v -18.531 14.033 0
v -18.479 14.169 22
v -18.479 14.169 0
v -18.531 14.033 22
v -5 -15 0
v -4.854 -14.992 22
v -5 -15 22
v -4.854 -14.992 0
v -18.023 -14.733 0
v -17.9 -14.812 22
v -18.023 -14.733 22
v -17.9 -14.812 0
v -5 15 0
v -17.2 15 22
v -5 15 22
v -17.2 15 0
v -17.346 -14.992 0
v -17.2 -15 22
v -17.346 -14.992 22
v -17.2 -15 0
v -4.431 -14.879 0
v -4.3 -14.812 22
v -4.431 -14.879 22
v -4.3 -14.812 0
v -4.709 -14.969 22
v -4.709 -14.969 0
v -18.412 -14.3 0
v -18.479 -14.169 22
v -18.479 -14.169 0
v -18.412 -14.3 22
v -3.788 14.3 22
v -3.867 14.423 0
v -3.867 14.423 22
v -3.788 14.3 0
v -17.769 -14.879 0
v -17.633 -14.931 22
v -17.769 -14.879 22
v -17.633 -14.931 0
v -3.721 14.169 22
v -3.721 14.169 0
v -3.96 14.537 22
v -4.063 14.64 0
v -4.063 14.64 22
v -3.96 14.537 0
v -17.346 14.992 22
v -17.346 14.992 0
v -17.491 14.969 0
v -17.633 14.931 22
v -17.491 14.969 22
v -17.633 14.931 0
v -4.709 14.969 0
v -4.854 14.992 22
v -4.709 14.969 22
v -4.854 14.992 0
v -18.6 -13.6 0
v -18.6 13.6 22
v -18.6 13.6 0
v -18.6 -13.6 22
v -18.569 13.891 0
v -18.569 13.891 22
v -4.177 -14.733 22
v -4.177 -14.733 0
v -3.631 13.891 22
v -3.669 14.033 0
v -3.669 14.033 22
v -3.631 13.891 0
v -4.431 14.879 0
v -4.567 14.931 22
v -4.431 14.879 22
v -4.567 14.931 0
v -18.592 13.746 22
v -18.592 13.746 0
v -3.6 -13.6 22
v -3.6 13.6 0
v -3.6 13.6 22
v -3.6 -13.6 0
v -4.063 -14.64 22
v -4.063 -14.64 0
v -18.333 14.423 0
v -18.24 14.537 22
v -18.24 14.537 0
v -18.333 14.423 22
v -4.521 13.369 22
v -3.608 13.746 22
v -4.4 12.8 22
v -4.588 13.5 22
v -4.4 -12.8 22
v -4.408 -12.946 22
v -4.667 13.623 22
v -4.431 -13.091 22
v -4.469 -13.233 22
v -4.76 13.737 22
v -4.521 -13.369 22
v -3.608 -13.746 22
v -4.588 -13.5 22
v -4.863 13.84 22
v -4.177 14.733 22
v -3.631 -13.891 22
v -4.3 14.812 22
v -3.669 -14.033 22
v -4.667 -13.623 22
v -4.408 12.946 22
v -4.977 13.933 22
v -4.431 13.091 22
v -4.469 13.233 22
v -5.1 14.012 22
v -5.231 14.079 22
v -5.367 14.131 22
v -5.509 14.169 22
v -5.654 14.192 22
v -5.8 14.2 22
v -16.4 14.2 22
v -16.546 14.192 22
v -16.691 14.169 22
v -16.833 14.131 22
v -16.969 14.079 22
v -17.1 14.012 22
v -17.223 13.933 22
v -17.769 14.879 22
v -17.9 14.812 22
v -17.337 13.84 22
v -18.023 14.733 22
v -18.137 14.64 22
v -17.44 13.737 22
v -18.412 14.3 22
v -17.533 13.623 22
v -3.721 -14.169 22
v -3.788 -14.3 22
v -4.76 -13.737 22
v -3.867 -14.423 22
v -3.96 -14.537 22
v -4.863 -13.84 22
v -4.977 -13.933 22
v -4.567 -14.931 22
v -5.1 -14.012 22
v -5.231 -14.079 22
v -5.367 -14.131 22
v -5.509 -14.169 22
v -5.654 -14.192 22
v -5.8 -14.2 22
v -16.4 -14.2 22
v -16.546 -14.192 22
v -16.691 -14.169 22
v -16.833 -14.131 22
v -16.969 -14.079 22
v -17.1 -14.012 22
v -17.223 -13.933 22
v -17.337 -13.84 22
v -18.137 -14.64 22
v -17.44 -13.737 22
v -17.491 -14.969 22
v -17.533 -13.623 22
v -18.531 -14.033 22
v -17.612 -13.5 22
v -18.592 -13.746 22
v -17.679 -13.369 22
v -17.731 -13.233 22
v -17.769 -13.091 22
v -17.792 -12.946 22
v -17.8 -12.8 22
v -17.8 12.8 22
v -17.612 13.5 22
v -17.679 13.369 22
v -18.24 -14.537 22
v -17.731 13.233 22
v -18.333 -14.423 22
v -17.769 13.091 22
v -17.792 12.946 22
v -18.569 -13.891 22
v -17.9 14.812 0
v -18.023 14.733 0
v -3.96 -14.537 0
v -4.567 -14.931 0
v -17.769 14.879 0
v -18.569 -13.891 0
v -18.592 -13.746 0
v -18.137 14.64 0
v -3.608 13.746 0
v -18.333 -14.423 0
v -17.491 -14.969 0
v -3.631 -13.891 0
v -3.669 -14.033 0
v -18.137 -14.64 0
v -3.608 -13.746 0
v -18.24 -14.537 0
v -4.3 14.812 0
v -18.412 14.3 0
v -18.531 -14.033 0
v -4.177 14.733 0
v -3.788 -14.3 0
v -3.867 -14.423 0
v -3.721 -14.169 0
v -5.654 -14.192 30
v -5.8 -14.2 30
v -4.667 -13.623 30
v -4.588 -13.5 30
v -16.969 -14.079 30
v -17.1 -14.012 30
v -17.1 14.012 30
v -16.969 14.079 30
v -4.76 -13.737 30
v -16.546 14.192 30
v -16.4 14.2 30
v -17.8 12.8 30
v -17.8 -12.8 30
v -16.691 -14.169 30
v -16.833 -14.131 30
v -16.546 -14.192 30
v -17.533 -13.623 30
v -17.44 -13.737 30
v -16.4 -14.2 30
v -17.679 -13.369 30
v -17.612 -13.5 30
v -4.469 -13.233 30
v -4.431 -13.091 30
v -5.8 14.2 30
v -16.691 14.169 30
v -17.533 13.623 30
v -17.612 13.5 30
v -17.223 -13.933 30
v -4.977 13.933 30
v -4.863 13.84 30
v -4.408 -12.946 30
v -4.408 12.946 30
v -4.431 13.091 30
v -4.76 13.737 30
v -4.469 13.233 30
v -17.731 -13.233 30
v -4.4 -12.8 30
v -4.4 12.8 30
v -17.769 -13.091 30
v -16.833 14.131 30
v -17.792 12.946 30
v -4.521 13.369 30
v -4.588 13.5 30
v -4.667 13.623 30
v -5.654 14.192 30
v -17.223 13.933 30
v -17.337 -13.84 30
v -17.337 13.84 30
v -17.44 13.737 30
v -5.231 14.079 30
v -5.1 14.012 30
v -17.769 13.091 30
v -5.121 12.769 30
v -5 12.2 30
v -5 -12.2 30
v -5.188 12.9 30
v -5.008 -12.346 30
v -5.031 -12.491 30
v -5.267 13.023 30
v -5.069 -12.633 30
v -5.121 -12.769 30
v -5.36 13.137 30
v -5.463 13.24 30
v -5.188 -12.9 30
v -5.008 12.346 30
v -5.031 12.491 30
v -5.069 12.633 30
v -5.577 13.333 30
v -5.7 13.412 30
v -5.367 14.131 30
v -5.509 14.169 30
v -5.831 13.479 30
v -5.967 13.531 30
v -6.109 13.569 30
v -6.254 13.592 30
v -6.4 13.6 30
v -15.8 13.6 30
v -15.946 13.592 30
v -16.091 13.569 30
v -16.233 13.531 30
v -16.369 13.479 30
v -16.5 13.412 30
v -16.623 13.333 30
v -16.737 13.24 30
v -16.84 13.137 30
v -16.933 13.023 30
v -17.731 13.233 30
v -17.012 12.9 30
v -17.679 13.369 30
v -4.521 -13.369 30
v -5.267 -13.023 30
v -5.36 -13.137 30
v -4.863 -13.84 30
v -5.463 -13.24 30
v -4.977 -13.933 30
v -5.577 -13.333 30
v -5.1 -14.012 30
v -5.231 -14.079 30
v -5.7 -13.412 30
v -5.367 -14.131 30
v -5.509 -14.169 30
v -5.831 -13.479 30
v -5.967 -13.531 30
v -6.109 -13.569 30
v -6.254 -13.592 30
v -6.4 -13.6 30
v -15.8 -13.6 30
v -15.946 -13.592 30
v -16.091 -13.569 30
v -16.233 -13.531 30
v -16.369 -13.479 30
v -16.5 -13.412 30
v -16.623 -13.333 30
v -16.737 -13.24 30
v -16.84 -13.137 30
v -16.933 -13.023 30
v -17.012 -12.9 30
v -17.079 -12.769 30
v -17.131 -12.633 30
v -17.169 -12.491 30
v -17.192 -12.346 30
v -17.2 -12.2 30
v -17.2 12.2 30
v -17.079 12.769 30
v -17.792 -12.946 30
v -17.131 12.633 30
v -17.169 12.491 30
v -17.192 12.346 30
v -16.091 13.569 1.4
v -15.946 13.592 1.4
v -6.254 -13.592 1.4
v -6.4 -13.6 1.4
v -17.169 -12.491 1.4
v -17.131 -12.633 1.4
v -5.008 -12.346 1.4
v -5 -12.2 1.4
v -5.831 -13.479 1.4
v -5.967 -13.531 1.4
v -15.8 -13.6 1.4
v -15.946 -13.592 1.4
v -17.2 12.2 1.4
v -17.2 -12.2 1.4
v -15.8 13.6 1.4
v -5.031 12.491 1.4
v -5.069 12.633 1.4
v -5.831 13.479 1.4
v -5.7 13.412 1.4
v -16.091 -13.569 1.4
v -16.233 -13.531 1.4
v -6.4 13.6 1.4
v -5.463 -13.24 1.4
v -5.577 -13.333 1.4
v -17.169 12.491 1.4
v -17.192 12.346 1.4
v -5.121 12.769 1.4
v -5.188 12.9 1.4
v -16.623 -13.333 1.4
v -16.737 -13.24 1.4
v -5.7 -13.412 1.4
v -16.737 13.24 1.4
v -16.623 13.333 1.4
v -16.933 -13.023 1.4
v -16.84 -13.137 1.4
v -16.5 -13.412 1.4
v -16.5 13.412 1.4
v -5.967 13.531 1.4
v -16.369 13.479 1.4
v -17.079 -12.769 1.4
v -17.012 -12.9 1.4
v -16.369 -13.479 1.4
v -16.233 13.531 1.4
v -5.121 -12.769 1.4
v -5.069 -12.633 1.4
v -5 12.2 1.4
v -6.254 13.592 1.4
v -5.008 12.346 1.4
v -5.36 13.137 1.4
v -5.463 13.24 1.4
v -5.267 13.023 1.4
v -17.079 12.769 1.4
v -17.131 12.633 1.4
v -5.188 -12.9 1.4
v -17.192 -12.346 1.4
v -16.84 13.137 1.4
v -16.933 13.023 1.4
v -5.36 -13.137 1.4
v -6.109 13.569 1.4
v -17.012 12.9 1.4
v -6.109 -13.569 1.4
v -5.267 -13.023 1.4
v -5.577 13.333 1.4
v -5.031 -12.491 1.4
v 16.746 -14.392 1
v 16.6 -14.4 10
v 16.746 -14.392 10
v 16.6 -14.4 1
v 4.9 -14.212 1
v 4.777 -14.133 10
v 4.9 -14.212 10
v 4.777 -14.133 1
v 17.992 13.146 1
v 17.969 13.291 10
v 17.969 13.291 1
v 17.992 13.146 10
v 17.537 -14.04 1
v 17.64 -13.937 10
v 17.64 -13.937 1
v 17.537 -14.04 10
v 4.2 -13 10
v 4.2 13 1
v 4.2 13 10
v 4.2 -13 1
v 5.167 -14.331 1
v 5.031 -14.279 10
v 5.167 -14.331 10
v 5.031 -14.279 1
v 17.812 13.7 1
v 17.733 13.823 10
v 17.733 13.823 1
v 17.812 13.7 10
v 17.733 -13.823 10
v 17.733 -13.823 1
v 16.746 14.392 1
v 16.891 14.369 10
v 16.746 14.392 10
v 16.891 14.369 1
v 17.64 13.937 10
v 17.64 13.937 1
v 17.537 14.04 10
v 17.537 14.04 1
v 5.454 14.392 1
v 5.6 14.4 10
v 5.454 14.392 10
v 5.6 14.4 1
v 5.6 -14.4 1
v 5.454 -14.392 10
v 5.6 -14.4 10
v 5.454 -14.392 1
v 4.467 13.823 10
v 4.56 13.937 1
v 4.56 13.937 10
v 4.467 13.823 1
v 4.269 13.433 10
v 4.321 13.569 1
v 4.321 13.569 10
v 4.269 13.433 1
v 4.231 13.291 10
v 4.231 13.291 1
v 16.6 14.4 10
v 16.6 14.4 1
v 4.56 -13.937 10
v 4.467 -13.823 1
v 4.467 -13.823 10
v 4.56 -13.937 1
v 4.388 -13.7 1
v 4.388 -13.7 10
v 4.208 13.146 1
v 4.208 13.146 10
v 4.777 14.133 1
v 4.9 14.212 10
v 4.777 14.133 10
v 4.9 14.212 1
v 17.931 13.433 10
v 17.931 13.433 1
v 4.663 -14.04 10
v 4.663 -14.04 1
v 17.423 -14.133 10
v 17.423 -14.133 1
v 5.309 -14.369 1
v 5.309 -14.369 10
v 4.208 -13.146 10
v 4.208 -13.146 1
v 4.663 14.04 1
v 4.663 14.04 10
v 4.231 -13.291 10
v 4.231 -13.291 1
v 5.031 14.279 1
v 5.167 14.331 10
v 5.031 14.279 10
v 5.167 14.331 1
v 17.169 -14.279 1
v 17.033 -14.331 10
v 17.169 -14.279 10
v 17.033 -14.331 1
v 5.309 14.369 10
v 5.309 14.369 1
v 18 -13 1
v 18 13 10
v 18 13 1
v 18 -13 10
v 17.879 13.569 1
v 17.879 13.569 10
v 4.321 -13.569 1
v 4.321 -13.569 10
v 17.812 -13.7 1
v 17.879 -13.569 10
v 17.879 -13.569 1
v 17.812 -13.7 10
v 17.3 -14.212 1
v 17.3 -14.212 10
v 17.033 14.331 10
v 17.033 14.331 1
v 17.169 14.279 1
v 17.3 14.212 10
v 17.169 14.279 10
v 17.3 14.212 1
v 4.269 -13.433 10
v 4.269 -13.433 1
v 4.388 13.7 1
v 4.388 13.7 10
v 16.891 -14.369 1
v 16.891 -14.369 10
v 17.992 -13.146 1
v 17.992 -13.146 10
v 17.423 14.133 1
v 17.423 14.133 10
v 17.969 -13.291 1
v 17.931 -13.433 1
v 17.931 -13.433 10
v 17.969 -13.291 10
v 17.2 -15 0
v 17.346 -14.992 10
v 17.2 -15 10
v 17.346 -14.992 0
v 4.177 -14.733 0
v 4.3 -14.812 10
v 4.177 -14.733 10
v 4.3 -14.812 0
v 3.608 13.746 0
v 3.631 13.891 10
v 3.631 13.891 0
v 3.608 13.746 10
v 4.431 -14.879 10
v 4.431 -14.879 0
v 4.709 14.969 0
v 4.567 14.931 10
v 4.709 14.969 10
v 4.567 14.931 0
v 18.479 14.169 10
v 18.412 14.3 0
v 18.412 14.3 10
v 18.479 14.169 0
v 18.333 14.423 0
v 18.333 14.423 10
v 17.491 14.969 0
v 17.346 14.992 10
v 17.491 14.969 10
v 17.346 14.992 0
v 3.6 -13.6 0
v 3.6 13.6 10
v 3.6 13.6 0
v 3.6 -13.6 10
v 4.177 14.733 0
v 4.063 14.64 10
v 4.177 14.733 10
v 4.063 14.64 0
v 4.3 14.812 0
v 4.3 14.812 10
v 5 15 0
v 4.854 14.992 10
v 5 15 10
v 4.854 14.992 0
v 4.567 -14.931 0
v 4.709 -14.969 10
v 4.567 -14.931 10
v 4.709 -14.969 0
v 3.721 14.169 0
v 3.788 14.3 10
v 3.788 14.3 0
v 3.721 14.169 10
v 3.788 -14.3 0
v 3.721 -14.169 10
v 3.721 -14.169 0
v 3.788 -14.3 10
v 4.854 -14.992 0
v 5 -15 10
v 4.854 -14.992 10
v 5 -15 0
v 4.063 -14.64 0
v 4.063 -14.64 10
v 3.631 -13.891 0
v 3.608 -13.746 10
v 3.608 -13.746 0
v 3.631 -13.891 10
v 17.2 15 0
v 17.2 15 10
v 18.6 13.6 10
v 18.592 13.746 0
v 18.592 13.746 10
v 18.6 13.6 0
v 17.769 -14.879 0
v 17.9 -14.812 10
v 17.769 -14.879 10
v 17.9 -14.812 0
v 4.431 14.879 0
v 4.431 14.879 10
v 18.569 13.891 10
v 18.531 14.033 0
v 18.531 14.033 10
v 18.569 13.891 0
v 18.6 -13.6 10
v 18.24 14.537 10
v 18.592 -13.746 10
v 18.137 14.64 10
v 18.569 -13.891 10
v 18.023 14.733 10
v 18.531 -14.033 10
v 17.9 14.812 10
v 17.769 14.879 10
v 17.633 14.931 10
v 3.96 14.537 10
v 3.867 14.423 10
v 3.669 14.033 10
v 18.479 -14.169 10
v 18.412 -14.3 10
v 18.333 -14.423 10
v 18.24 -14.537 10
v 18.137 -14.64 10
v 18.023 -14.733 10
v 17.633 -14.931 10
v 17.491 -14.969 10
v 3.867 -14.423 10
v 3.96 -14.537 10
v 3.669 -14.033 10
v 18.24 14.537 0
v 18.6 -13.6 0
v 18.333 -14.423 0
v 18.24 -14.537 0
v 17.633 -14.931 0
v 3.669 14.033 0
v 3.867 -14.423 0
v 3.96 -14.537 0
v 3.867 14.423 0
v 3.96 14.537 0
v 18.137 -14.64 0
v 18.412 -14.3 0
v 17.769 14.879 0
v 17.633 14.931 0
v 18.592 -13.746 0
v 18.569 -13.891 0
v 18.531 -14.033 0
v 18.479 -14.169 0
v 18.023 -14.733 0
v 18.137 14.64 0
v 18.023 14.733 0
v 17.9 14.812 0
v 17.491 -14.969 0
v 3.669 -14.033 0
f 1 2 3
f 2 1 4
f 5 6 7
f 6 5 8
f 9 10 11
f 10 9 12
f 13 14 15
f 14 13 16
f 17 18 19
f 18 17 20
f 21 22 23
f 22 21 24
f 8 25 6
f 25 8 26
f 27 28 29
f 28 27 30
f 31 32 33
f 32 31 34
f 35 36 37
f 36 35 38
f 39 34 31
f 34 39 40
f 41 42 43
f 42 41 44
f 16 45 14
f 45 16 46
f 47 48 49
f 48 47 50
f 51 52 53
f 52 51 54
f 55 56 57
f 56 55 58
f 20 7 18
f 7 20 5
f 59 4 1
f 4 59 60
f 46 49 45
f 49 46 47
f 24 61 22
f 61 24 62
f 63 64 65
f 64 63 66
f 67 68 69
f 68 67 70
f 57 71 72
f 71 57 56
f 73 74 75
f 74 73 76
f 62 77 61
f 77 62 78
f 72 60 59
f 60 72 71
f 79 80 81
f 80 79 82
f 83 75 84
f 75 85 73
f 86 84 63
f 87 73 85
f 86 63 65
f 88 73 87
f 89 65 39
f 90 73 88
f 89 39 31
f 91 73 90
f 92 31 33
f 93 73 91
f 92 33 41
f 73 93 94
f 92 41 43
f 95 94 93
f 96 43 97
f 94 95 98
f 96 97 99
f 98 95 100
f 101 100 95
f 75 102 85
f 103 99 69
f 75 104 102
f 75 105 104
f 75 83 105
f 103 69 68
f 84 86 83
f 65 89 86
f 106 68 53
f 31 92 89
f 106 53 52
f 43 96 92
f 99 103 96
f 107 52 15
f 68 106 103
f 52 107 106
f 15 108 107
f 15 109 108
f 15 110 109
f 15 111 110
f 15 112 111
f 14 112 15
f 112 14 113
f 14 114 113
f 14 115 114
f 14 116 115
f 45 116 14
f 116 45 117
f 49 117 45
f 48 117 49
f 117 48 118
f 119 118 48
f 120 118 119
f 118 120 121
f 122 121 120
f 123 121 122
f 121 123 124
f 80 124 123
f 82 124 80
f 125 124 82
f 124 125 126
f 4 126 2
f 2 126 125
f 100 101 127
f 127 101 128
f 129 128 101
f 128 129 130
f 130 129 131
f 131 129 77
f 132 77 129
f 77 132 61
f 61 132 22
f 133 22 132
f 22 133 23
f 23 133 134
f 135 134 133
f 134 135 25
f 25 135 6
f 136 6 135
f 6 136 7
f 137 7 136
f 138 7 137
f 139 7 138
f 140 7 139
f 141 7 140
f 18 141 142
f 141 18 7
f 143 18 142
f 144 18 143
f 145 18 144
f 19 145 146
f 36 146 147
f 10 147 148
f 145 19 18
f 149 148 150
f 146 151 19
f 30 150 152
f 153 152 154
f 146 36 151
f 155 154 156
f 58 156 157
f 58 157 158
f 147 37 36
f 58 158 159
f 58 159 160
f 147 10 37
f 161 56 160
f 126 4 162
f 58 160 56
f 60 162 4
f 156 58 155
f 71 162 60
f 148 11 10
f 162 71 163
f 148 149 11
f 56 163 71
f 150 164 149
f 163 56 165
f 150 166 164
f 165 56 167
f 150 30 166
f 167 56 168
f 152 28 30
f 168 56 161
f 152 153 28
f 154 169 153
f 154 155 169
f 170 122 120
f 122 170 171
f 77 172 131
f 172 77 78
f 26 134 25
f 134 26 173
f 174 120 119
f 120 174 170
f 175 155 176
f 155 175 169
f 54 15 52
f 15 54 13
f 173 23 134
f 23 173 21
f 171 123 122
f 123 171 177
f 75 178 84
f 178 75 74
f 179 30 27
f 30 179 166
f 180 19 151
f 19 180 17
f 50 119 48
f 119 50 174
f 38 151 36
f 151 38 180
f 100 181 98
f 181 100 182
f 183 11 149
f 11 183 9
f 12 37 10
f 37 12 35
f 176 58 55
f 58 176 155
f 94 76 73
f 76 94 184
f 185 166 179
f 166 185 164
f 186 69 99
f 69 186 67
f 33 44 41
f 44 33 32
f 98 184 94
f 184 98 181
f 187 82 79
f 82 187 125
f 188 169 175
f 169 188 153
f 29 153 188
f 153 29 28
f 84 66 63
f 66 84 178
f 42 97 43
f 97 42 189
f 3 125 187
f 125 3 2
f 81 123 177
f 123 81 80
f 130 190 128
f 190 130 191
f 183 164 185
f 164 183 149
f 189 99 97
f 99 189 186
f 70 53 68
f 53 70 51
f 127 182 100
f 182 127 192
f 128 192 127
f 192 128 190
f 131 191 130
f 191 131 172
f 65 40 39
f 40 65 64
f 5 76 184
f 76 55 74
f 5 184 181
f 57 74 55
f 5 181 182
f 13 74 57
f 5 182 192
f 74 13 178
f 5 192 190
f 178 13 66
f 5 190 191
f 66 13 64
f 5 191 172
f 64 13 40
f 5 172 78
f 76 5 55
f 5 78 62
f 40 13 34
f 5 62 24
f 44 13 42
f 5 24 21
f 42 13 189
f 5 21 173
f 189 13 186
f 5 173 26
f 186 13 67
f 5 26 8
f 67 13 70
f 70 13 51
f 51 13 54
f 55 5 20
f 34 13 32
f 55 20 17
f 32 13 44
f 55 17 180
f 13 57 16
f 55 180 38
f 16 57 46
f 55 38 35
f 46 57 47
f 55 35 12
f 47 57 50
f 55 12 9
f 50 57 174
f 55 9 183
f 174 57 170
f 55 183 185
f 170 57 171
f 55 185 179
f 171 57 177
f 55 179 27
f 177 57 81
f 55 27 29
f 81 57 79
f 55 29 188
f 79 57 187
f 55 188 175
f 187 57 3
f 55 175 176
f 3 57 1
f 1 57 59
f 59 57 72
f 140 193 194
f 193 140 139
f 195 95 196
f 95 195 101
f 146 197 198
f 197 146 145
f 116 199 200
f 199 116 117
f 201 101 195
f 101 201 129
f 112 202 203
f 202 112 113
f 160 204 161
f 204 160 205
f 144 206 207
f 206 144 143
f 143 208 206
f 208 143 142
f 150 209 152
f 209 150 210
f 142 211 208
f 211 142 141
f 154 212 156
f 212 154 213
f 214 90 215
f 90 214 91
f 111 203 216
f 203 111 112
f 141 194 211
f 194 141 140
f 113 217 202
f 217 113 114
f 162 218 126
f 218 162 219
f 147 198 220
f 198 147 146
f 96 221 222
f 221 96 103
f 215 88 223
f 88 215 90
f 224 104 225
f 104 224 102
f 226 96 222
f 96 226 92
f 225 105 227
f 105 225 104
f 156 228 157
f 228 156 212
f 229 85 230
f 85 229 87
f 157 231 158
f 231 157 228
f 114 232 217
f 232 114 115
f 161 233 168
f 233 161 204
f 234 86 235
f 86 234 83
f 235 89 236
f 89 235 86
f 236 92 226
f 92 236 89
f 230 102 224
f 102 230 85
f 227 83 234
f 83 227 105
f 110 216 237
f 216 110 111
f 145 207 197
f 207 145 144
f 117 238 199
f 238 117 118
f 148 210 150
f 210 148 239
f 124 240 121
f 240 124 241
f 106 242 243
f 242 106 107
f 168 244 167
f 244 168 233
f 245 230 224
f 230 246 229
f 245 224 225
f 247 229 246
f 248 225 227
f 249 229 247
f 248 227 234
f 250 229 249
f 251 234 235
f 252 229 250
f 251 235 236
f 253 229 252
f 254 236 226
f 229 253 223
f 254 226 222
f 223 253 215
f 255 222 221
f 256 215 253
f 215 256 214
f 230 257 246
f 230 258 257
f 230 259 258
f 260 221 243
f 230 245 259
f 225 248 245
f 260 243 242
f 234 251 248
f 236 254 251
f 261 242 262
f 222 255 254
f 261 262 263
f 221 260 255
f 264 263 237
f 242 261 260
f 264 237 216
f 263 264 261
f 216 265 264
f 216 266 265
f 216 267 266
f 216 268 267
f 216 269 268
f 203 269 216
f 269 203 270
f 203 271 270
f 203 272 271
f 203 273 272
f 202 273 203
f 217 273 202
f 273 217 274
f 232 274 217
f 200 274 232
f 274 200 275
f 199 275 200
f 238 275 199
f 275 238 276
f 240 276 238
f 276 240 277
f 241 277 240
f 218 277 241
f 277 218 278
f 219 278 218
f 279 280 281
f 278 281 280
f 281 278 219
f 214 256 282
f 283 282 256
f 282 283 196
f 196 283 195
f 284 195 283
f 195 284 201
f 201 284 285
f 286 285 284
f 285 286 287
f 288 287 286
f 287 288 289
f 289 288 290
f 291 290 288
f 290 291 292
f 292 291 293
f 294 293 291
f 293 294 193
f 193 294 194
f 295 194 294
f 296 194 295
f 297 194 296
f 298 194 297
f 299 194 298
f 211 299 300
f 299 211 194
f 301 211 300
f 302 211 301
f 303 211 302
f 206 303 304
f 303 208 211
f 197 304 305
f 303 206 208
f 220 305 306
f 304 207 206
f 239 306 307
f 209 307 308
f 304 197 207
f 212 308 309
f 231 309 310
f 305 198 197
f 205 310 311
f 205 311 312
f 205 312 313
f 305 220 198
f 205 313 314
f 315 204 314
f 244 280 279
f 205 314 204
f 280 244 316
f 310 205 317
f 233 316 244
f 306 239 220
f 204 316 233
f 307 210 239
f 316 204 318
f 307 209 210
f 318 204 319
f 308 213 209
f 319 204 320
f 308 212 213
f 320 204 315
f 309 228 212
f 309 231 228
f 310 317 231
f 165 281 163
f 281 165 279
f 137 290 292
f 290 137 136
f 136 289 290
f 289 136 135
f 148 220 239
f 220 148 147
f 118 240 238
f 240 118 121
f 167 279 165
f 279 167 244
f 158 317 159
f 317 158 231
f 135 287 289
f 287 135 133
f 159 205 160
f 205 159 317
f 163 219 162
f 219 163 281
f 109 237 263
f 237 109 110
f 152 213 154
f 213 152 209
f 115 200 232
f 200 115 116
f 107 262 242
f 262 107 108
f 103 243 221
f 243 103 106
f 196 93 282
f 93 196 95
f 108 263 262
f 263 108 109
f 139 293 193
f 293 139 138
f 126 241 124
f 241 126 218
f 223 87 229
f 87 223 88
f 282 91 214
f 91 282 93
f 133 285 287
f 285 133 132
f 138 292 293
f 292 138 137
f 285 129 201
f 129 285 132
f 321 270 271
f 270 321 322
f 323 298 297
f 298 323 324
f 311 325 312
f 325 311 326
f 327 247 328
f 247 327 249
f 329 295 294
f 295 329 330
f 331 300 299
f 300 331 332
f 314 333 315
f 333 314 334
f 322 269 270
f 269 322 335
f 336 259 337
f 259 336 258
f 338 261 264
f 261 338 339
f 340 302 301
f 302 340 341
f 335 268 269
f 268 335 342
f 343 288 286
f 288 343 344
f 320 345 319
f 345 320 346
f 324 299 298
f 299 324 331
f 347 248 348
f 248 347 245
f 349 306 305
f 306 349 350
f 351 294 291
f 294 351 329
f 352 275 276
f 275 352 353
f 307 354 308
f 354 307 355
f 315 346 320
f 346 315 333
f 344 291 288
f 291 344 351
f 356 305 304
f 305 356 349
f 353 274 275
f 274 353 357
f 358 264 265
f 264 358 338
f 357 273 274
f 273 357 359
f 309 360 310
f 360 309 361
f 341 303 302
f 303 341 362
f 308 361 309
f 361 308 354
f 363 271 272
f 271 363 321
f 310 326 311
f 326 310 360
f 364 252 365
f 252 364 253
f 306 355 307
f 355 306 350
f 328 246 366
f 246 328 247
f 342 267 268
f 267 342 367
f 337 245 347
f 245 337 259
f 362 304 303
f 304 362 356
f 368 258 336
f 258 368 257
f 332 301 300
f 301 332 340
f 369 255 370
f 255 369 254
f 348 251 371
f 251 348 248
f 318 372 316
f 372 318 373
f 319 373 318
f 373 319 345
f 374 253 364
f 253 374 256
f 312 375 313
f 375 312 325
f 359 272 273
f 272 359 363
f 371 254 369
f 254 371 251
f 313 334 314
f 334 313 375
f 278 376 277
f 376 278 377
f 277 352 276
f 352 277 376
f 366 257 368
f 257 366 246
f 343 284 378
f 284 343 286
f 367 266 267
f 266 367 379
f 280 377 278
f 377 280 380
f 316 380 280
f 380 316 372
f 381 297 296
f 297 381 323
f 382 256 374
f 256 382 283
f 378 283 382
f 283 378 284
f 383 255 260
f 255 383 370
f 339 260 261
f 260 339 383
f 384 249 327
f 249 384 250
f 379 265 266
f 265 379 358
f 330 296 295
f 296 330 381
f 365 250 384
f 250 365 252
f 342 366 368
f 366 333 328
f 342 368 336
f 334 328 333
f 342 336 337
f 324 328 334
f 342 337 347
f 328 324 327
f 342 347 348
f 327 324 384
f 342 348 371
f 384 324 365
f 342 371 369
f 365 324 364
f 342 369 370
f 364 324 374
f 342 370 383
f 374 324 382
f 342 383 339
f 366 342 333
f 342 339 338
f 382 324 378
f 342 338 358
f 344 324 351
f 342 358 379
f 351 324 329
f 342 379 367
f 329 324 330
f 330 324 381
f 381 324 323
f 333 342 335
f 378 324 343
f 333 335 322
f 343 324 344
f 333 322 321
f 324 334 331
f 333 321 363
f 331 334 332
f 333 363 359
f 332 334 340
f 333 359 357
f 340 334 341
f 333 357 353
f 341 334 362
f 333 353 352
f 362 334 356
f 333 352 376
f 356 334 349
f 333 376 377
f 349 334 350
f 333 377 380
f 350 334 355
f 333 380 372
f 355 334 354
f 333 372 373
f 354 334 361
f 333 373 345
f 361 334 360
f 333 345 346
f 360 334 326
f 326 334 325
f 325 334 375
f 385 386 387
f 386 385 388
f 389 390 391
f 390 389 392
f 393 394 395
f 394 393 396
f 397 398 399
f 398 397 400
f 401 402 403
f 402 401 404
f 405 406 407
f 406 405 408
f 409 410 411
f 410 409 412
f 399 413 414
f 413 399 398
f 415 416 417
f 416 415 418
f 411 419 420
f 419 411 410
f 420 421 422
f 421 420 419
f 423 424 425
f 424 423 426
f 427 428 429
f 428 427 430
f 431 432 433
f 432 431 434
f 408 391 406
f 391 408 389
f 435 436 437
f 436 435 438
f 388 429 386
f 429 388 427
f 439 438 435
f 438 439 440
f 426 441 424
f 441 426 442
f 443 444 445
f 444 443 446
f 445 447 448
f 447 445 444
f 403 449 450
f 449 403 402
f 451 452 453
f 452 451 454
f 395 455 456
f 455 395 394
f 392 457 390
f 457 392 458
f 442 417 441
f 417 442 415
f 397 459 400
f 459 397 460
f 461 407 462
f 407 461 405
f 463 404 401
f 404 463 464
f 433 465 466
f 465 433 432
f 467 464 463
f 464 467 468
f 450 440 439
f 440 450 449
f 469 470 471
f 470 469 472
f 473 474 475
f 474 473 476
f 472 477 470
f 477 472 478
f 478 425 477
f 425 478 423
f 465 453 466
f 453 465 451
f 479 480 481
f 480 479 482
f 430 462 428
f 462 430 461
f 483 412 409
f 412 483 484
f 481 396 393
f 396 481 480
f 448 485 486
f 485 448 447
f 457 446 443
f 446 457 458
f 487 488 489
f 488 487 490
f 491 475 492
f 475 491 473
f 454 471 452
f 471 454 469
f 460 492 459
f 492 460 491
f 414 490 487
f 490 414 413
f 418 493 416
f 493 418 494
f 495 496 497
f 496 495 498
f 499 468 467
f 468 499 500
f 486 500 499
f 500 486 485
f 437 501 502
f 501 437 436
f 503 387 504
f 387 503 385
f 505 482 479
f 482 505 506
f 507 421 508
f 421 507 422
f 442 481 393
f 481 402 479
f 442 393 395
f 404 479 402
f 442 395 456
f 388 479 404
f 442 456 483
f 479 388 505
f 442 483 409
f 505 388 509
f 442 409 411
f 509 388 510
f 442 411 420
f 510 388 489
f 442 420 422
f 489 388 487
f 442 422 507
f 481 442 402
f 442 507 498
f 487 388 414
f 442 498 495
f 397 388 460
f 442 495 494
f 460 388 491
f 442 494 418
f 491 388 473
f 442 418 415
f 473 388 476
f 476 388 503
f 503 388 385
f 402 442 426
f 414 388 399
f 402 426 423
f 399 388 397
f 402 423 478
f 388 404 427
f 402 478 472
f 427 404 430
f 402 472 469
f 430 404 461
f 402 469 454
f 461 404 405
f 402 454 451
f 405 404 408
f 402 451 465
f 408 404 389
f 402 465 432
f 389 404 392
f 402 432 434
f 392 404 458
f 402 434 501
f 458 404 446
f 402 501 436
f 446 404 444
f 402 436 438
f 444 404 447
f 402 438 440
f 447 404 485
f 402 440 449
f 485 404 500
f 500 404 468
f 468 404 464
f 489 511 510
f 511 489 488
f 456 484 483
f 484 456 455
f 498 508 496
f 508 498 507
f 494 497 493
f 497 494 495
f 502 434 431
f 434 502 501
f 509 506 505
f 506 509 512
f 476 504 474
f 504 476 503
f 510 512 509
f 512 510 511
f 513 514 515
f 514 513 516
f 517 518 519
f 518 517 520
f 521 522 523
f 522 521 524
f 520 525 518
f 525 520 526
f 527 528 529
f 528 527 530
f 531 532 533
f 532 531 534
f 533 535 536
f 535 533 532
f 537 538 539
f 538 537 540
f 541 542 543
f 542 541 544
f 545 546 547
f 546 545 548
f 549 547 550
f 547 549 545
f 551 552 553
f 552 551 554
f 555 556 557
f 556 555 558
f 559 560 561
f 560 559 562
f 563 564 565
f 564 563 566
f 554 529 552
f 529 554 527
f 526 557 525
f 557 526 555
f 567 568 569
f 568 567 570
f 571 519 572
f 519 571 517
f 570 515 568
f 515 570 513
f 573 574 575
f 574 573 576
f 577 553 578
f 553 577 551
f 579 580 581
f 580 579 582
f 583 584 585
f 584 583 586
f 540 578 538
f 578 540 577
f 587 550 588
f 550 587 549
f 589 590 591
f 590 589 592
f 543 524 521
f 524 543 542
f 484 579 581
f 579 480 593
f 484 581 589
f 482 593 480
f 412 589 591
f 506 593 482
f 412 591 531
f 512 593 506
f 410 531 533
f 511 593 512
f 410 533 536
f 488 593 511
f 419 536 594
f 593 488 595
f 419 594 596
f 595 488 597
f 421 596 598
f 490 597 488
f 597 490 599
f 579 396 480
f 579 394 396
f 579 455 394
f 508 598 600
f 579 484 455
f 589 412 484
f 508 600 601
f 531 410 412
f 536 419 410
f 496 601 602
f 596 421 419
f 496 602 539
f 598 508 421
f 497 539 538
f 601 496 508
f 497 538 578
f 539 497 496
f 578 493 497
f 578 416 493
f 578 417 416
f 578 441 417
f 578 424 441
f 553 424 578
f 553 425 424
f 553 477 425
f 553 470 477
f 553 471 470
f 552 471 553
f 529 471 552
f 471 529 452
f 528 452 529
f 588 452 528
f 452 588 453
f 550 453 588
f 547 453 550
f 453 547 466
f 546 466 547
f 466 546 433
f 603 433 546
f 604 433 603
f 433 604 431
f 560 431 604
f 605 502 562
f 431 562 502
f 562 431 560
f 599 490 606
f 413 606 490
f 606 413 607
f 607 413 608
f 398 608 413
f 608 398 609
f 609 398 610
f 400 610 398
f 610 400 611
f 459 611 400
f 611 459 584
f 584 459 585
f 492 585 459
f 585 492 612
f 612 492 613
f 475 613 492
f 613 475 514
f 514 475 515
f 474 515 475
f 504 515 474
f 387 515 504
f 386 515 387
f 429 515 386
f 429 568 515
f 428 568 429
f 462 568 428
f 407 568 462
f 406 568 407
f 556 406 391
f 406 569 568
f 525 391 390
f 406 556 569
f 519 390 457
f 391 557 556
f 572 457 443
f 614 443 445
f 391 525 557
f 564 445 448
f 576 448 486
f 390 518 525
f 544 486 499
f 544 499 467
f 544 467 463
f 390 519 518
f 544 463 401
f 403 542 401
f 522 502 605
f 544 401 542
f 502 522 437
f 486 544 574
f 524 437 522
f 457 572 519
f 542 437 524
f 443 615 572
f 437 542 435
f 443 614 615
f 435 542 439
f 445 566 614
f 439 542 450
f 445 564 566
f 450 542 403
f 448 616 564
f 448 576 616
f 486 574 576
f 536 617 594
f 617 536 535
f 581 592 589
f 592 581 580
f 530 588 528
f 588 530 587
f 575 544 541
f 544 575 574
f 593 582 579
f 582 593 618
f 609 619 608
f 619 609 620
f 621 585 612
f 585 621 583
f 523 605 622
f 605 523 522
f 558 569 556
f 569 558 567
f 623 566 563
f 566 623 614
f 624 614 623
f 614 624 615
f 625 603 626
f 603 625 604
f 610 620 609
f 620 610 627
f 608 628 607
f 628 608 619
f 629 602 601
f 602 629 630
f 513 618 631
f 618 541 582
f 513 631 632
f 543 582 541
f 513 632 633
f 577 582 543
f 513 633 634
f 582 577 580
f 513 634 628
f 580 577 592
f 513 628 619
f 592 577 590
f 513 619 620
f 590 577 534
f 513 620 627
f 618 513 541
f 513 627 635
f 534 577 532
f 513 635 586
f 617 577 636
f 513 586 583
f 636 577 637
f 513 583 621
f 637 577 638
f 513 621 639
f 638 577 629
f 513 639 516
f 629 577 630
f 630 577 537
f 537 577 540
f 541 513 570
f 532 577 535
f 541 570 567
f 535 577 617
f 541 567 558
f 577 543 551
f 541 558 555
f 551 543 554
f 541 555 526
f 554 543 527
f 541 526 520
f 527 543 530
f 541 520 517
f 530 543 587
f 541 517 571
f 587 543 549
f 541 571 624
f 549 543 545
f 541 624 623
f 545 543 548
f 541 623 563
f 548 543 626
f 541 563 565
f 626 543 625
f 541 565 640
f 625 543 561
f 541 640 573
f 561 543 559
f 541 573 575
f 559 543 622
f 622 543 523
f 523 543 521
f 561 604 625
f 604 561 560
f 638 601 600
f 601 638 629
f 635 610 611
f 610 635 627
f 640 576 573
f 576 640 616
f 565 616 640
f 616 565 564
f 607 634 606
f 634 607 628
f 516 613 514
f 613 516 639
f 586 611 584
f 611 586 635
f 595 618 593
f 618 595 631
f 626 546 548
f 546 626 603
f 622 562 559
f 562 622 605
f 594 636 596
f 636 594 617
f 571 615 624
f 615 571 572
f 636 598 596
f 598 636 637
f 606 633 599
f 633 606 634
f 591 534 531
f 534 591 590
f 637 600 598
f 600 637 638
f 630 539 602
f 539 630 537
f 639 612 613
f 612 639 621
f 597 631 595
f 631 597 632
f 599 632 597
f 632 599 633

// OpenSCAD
// Outer box width
outerWidth = 15;

// Outer box depth
outerDepth = 30;

// Outer total box height
outerHeight = 32;

// Lid height
lidHeight = 10;

// Number of vertical spaces
numSeparatorsX = 1; // [1:20]

// Number of horizontal spaces
numSeparatorsY = 1; // [1:20]

// Outer wall thickness
outerWallThickness = 1.4;

// Show parts
showParts = 0; // [0:All, 1:Base, 2:Lid]

// Tolerance
tolerance = 0.1;

/* [Hidden] */
wt = outerWallThickness;
boxWidth = outerWidth-2*wt;
boxDepth = outerDepth-2*wt;
boxHeight = outerHeight;

$fn=60;
il=9;
iw=wt/2-tolerance;

if (showParts != 2) {
translate([-boxWidth/2-5, 0, 0]) {
    box_base(boxWidth, boxDepth, boxHeight, lidHeight);
    separators(numSeparatorsX, numSeparatorsY , boxWidth, boxDepth, boxHeight-lidHeight+il-1);
}
}

if (showParts != 1) {
translate([boxWidth/2+5, 0, 0])
box_lid(boxWidth, boxDepth, lidHeight);
}

module separators (nx, ny, sizeX, sizeY, height) {
    xS = sizeX / nx;
    yS = sizeY / ny;
    union(){
        if ( nx > 1) {
            for ( a = [0 : nx-2] ) {
                translate([-sizeX/2+xS*(a+1), 0, 0])
                    linear_extrude(height=height)
                    square([iw, sizeY], center = true);
            }
        }
        if ( ny > 1) {
            for ( b = [0 : ny-2] ) {
                translate([0, -sizeY/2+yS*(b+1), 0])
                    linear_extrude(height=height)
                    square([sizeY, iw], center = true);
            }
        }
    }

}


module box_lid (width, depth, height) {
    difference() {
        
        linear_extrude(height=height) {
        offset(wt)
        square([width, depth], center = true);
        }
    
        union() {
            translate([0, 0, height-il])
            linear_extrude(height=il+1) {
            offset(wt)
             square([width-2*iw, depth-2*iw], center = true);
            }

            translate([0, 0, wt])
            linear_extrude(height=height-wt+1) {
            offset(wt)
             square([width-2*wt, depth-2*wt], center = true);
            }
        }
    }    
}

module box_base(width, depth, height, lid) {
    difference(){
        union(){
            linear_extrude(height=height-lid) {
            offset(wt)
            square([width, depth], center = true);
            }

            linear_extrude(height=height-lid+il-1)
            offset(wt)
            square([width-2*wt+2*iw, depth-2*wt+2*iw], center = true);
        }

        translate([0, 0, wt])
        linear_extrude(height=height-lid+il)
        offset(wt)
        square([width-2*wt, depth-2*wt], center = true);
    }
}
